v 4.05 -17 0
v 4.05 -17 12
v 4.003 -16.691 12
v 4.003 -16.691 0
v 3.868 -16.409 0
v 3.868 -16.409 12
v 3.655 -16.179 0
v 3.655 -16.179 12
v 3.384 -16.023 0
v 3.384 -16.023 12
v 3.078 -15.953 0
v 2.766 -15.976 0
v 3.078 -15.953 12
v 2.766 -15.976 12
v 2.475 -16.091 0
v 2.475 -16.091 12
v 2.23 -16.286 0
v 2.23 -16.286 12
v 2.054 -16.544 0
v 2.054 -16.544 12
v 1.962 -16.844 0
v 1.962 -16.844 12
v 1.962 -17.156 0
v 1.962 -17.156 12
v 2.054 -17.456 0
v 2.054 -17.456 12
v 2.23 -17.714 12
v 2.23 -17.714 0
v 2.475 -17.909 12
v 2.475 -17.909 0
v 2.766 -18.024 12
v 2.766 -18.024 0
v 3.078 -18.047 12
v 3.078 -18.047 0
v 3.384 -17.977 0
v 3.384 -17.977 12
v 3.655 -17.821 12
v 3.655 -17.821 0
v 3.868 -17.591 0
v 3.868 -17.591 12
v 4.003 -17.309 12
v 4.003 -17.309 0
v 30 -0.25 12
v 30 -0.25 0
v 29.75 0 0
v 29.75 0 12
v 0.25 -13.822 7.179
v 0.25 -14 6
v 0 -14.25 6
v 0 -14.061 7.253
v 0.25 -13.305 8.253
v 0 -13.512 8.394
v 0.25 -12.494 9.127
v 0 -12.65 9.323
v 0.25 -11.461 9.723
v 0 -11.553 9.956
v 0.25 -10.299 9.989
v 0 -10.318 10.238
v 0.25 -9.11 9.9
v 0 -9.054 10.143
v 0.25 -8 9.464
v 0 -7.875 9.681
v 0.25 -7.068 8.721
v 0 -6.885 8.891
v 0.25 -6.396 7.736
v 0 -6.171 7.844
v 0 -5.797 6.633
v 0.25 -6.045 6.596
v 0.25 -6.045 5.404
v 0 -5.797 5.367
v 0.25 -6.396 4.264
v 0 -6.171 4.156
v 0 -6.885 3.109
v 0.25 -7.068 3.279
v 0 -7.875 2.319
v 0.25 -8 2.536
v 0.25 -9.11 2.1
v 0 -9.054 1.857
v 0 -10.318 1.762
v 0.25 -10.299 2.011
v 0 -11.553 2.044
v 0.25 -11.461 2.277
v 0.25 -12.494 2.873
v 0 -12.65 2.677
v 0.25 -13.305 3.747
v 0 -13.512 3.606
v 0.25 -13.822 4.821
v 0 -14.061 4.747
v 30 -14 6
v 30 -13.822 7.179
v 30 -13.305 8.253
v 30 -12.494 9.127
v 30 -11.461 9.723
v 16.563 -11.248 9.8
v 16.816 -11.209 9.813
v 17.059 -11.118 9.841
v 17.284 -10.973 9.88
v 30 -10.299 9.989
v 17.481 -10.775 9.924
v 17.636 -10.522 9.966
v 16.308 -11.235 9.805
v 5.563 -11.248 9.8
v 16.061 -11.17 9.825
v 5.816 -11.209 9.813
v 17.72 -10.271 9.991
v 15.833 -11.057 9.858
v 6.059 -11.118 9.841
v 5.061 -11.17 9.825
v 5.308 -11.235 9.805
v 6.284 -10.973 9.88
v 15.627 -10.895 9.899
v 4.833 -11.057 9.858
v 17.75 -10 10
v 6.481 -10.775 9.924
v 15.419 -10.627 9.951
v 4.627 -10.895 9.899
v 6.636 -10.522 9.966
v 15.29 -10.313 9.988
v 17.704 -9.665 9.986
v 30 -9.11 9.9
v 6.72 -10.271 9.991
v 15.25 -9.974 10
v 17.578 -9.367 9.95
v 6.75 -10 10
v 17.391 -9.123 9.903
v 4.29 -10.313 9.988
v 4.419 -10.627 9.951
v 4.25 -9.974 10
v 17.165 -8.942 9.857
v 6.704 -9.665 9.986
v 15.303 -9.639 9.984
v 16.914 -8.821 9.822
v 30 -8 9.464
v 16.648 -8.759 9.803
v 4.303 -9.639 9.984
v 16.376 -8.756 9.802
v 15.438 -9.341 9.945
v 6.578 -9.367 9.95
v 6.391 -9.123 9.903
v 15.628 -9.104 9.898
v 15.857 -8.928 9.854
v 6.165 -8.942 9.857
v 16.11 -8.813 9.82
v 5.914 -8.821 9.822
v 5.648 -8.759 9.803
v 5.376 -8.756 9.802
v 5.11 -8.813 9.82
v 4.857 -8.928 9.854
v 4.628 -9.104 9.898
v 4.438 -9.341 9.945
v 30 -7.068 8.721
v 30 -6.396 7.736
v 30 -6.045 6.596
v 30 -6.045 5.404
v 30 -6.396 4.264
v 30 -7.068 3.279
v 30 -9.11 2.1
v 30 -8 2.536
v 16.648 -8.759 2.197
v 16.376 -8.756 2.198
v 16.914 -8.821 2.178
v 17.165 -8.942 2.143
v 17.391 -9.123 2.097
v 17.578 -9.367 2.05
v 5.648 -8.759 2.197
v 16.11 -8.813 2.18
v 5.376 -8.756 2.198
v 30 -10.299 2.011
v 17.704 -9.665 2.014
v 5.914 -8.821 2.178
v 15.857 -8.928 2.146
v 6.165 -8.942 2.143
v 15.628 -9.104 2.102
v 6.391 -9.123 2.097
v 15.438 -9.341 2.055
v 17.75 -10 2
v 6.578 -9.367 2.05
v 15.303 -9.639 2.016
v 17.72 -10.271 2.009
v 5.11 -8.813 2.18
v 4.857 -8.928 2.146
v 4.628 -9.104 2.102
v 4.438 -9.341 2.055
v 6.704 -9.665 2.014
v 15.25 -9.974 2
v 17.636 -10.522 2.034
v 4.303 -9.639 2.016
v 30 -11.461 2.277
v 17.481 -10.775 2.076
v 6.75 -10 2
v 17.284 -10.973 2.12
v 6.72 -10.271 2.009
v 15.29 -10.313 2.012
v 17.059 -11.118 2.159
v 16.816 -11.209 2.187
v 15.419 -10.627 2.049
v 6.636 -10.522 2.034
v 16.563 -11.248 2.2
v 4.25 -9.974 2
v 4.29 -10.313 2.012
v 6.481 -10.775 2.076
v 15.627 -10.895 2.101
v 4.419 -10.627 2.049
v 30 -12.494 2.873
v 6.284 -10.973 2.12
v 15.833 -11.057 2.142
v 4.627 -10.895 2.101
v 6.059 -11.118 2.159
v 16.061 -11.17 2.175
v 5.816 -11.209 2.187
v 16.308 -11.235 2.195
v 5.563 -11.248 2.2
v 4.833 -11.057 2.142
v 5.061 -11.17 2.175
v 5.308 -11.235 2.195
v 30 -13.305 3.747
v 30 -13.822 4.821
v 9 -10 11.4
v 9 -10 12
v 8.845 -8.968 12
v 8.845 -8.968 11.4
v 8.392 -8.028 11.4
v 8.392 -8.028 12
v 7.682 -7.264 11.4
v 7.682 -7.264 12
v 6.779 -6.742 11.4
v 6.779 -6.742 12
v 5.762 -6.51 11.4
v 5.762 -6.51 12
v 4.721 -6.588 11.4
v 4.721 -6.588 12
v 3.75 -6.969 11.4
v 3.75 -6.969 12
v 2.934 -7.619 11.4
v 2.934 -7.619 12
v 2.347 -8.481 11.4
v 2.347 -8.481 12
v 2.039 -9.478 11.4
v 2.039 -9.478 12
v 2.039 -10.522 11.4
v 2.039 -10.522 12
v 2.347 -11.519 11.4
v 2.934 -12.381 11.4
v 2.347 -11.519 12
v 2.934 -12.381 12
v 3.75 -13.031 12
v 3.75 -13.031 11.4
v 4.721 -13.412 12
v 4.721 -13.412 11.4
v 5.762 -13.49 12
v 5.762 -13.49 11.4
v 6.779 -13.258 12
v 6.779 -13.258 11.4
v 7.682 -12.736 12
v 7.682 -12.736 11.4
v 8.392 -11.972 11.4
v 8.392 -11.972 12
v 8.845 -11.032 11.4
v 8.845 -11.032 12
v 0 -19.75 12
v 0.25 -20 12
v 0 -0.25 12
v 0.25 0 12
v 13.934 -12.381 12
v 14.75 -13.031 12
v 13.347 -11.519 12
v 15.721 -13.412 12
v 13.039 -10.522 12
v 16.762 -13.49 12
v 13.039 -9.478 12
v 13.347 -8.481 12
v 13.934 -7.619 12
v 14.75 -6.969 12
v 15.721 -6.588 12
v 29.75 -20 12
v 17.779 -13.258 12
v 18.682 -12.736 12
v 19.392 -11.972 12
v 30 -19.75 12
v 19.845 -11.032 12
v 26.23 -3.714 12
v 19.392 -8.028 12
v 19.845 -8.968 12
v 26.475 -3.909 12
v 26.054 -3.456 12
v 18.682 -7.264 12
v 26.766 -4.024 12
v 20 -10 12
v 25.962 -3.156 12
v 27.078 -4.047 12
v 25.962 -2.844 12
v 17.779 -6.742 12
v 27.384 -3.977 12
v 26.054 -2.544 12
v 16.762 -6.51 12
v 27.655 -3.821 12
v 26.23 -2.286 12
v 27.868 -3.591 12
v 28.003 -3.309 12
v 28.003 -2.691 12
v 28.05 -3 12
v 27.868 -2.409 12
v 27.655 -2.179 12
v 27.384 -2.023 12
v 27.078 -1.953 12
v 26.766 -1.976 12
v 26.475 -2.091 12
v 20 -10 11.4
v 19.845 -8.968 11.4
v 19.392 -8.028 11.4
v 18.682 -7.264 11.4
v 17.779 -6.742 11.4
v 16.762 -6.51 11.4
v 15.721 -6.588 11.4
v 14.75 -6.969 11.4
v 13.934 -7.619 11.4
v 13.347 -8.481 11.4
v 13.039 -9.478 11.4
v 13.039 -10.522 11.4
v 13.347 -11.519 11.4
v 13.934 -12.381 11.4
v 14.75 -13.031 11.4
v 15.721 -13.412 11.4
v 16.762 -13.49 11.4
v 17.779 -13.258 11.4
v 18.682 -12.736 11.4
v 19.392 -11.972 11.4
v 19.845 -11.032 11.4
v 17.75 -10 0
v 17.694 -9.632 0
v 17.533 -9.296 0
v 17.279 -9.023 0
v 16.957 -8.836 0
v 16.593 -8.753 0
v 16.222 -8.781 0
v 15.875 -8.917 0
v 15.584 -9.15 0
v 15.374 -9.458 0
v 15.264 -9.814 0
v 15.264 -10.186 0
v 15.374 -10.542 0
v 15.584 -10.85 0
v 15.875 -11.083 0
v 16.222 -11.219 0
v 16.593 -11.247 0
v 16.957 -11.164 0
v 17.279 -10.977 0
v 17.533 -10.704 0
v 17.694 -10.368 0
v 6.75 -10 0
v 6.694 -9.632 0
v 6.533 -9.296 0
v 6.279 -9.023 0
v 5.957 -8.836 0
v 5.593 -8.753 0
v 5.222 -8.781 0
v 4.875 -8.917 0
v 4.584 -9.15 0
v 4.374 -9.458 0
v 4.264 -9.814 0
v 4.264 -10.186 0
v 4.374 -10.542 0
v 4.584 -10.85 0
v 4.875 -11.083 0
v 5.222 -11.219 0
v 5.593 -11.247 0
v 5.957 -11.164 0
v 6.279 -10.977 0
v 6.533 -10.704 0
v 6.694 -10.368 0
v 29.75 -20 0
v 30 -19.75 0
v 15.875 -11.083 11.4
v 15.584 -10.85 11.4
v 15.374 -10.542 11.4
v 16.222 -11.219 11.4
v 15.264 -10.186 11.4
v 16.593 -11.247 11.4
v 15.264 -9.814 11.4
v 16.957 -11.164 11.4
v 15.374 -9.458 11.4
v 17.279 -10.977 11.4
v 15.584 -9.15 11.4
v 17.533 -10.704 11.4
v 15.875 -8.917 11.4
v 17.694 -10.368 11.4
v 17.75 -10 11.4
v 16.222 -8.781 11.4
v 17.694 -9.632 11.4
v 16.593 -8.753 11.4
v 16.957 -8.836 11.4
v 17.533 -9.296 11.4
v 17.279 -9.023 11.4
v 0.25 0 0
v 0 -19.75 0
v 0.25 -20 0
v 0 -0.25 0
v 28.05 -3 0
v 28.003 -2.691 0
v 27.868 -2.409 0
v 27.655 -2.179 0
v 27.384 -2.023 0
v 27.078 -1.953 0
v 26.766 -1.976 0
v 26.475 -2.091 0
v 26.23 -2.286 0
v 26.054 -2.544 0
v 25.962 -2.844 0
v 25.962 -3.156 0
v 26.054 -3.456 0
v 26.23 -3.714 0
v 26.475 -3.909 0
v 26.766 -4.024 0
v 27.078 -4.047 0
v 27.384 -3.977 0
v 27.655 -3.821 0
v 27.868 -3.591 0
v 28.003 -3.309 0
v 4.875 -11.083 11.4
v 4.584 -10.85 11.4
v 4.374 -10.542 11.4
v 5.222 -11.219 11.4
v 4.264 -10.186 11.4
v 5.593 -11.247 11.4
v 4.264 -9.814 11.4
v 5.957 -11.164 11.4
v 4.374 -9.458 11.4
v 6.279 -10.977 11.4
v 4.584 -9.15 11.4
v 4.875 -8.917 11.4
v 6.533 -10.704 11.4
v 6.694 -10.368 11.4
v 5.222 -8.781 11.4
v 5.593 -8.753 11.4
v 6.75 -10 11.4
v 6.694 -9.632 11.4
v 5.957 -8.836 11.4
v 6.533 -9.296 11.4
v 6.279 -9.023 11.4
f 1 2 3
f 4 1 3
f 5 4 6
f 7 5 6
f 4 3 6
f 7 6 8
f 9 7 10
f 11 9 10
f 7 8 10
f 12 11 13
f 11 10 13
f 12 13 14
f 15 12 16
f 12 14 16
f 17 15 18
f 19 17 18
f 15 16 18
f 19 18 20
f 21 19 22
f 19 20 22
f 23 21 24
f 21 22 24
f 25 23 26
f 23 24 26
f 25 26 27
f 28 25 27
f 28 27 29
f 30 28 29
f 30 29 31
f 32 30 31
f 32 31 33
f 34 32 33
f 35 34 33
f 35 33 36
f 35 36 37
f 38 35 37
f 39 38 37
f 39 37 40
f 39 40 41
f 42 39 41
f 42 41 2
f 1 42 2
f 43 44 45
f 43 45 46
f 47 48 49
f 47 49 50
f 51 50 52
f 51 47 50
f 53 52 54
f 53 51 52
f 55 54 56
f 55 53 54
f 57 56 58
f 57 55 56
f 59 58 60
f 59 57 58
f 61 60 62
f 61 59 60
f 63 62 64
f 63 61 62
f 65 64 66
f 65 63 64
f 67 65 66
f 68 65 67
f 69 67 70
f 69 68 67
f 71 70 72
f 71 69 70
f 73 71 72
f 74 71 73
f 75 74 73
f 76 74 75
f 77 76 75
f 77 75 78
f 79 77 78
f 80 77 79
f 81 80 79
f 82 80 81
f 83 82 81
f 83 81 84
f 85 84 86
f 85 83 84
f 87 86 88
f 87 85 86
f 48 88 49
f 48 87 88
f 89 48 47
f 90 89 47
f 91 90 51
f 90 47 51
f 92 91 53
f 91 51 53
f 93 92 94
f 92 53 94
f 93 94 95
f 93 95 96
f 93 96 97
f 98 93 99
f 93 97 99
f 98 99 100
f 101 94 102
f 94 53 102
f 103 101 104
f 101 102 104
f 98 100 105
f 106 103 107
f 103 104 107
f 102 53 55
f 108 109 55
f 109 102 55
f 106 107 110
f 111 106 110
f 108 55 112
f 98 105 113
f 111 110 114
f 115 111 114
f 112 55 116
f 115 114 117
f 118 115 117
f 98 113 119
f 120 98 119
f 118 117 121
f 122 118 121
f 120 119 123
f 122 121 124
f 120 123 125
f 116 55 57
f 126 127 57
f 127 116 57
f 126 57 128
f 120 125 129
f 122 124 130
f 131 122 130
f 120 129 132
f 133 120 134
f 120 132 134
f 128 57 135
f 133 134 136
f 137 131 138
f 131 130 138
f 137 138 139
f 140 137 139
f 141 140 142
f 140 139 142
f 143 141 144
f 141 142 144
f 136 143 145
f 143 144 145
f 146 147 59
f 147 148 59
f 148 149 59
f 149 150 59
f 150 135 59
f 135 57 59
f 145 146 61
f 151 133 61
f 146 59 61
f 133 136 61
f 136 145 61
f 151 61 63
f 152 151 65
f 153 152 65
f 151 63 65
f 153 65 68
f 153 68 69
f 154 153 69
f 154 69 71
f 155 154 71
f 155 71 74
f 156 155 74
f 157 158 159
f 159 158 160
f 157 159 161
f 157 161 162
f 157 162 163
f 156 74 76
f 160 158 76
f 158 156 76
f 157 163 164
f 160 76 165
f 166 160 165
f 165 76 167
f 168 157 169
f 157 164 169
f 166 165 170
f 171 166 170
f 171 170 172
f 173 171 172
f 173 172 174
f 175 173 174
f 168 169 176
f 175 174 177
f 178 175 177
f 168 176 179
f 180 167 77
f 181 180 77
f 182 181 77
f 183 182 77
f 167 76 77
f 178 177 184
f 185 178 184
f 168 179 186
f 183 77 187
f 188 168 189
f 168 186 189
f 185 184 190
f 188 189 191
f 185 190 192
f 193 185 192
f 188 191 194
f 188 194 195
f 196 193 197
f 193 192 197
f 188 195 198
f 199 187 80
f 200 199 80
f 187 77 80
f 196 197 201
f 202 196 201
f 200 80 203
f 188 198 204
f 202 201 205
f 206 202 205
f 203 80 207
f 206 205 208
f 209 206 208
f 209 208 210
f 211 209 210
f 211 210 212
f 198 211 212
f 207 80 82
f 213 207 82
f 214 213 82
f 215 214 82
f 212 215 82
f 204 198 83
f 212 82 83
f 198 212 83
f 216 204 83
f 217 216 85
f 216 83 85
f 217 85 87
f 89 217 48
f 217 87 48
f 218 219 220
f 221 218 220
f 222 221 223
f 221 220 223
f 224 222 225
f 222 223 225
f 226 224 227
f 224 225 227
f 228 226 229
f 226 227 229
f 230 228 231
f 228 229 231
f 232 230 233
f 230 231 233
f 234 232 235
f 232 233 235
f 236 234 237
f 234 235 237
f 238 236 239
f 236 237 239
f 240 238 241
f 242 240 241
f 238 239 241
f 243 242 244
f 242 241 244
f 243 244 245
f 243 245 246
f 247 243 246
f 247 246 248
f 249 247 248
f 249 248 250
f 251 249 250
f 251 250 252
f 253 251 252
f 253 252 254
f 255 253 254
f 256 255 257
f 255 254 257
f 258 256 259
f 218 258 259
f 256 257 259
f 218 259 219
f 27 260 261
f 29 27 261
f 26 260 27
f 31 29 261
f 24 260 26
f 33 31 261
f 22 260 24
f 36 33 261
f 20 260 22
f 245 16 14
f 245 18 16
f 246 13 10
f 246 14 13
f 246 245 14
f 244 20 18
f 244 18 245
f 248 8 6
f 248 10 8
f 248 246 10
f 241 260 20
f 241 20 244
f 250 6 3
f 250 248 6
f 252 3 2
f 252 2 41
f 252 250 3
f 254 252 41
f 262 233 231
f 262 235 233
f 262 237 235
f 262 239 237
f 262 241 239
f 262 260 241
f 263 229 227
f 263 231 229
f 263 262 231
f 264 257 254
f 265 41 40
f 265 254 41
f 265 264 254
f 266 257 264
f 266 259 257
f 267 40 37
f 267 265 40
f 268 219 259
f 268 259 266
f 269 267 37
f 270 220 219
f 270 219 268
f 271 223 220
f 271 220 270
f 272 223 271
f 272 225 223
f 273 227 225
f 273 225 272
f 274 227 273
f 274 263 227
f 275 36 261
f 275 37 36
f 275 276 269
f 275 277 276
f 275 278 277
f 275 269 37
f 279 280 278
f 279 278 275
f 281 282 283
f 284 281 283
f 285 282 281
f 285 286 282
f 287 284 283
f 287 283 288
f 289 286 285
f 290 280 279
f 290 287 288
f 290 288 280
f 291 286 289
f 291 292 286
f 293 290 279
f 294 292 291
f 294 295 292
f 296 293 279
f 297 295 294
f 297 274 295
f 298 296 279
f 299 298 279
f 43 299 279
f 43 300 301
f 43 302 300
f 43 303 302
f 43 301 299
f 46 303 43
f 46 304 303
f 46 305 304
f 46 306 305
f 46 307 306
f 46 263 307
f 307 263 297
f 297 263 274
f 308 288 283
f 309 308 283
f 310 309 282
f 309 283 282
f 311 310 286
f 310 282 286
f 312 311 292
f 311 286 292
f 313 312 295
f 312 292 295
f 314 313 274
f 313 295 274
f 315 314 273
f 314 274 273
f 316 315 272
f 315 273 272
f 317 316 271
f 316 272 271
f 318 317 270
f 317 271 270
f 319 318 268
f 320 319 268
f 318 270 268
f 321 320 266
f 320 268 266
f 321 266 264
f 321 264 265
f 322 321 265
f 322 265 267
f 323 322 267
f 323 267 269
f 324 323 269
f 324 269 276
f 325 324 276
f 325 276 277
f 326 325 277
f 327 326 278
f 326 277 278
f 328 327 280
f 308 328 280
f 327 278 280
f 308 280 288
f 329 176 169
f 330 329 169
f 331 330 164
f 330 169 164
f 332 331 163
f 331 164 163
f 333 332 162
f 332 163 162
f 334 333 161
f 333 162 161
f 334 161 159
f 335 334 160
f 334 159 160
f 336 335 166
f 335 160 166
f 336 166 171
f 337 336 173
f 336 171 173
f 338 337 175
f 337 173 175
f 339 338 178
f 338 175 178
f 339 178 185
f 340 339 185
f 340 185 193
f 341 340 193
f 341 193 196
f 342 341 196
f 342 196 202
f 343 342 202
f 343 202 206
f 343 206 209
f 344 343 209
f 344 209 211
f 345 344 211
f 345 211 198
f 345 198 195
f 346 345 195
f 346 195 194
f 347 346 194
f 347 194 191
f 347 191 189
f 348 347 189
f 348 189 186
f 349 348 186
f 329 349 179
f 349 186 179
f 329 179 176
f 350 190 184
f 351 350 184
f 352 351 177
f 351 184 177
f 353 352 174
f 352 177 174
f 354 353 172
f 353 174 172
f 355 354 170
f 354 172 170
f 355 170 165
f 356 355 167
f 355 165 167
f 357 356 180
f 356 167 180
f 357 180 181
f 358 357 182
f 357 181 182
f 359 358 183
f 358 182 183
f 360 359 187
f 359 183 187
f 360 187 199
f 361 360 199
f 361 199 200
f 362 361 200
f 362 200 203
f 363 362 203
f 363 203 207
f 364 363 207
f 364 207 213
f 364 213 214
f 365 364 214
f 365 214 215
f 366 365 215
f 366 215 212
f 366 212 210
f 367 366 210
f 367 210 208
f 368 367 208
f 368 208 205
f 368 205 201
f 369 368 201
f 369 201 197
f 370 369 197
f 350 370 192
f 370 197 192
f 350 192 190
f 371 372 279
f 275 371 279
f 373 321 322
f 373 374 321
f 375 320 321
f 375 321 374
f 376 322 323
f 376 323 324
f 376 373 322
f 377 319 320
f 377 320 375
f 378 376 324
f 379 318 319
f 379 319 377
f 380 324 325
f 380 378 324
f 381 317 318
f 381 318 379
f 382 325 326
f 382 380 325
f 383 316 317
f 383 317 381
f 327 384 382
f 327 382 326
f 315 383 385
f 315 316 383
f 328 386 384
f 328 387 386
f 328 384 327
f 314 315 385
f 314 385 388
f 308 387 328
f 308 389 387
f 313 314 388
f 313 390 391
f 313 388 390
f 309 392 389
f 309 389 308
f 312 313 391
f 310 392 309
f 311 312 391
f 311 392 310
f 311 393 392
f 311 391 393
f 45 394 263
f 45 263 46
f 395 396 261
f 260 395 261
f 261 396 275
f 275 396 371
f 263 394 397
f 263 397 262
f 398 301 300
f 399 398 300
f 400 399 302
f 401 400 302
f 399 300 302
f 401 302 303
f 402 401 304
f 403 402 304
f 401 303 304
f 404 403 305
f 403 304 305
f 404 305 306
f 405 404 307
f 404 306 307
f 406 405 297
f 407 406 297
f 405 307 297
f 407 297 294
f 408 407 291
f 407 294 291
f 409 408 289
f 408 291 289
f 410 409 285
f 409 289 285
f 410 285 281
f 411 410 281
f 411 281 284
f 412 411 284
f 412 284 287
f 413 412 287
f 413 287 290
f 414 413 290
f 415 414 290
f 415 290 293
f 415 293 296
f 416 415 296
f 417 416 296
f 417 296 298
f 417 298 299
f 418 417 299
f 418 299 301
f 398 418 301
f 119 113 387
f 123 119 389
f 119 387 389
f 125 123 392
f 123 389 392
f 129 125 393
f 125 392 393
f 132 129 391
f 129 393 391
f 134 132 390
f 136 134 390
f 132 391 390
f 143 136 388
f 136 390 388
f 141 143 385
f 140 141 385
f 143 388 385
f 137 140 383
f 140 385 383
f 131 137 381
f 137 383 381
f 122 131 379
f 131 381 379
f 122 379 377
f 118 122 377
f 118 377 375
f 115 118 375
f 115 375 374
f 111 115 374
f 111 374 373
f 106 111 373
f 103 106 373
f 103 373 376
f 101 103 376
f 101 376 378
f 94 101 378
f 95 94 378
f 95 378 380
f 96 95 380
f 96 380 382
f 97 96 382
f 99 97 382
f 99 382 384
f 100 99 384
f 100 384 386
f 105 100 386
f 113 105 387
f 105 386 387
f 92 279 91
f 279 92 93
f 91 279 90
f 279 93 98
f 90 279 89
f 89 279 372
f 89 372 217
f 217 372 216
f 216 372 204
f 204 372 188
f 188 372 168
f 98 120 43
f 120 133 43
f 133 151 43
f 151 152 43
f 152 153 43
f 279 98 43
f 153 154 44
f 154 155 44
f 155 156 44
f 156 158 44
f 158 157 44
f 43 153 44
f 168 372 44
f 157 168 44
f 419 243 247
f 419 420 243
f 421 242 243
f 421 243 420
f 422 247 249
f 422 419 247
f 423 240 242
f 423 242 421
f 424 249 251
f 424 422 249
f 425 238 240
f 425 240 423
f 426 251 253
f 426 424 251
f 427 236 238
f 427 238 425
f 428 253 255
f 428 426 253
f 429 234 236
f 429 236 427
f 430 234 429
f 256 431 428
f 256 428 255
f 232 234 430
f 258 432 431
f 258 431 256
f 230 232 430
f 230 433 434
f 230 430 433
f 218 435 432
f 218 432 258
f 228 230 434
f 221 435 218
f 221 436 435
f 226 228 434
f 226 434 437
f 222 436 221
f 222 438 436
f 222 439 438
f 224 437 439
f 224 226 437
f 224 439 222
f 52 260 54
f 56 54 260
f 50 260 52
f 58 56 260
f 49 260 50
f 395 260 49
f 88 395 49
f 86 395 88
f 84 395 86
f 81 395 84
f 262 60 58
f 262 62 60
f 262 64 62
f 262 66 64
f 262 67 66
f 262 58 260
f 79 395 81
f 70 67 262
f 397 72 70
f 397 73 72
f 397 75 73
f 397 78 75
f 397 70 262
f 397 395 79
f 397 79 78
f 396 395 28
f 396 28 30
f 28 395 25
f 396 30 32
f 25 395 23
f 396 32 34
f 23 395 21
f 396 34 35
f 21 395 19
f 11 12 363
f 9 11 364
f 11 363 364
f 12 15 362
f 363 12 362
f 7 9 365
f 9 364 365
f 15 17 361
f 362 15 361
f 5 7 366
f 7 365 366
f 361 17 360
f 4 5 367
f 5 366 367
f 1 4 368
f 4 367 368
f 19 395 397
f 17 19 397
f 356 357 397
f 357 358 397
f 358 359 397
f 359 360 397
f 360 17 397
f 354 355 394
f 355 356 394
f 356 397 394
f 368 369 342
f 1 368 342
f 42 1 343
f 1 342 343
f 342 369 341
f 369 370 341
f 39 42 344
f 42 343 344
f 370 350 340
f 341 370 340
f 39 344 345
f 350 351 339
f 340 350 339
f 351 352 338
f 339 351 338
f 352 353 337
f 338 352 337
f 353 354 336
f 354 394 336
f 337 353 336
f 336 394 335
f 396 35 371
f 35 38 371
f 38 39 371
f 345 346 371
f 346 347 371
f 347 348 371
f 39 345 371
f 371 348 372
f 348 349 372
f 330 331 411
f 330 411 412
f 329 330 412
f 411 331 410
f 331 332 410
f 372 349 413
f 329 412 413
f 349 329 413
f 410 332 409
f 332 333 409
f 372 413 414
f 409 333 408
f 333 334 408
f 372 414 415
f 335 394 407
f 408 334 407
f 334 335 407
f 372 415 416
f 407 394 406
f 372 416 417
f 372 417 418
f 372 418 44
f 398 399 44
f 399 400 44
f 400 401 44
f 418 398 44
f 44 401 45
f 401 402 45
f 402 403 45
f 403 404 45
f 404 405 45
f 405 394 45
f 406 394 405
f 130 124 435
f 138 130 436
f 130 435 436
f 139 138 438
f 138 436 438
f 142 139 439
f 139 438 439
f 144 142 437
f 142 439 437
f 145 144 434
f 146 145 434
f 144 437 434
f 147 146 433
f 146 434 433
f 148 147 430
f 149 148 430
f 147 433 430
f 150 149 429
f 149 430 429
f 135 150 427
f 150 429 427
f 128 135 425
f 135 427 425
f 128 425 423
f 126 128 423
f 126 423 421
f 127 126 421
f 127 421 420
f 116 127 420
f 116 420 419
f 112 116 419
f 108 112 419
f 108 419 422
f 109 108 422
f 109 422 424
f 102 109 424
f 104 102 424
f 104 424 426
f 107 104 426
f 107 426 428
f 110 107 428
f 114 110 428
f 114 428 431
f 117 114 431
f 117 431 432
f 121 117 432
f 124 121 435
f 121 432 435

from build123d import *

# Parameters (mm, degrees)
F0_W      = 30
F0_H      = 20
F1_DEPTH  = 12
F2_R      = 4
F3_DEPTH  = 30
F4_R      = 1.25
F5_DEPTH  = 25
F4_R_2    = 1.05
F8_DEPTH  = 25
F9_SIZE   = 0.25
F4_R_3    = 3.5
F4_R_4    = 2.5
F10_DEPTH = 0.6


with BuildPart() as f1:
    # F0 (on Top) → F1 (new body)
    with BuildSketch(Plane.XY):
        with Locations((15, -10)):
            Rectangle(F0_W, F0_H)
    extrude(amount=F1_DEPTH)

    # F2 (on face) → F3 (cut)
    with BuildSketch(Plane(origin=(0, 0, 0), x_dir=(0, -1, 0), z_dir=(-1, 0, 0))):
        with Locations((10, 6)):
            Circle(F2_R)
    extrude(amount=-F3_DEPTH, mode=Mode.SUBTRACT)

    # F4 (on face) → F5 (cut)
    with BuildSketch(Plane.XY.offset(12)):
        with Locations((5.5, -10)):
            Circle(F4_R)
        with Locations((16.5, -10)):
            Circle(F4_R)
    extrude(amount=-F5_DEPTH, mode=Mode.SUBTRACT)

    # F4 (on face) → F8 (cut)
    with BuildSketch(Plane.XY.offset(12)):
        with Locations((3, -17)):
            Circle(F4_R_2)
        with Locations((27, -3)):
            Circle(F4_R_2)
    extrude(amount=-F8_DEPTH, mode=Mode.SUBTRACT)

    # F9
    f9_edges = [f1.edges().sort_by_distance(p)[0] for p in [
        (0, -6, 6),
        (0, 0, 6),
        (0, -20, 6),
        (30, 0, 6),
        (30, -20, 6),
    ]]
    chamfer(f9_edges, length=F9_SIZE)

    # F4 (on face) → F10 (cut)
    with BuildSketch(Plane.XY.offset(12)):
        with Locations((5.5, -10)):
            Circle(F4_R_3)
        with Locations((5.5, -10)):
            Circle(F4_R_4, mode=Mode.SUBTRACT)
        with Locations((16.5, -10)):
            Circle(F4_R_3)
        with Locations((16.5, -10)):
            Circle(F4_R_4, mode=Mode.SUBTRACT)
        with Locations((16.5, -10)):
            Circle(F4_R_4)
        with Locations((16.5, -10)):
            Circle(F4_R, mode=Mode.SUBTRACT)
        with Locations((5.5, -10)):
            Circle(F4_R_4)
        with Locations((5.5, -10)):
            Circle(F4_R, mode=Mode.SUBTRACT)
    extrude(amount=-F10_DEPTH, mode=Mode.SUBTRACT)


solid = f1.part
